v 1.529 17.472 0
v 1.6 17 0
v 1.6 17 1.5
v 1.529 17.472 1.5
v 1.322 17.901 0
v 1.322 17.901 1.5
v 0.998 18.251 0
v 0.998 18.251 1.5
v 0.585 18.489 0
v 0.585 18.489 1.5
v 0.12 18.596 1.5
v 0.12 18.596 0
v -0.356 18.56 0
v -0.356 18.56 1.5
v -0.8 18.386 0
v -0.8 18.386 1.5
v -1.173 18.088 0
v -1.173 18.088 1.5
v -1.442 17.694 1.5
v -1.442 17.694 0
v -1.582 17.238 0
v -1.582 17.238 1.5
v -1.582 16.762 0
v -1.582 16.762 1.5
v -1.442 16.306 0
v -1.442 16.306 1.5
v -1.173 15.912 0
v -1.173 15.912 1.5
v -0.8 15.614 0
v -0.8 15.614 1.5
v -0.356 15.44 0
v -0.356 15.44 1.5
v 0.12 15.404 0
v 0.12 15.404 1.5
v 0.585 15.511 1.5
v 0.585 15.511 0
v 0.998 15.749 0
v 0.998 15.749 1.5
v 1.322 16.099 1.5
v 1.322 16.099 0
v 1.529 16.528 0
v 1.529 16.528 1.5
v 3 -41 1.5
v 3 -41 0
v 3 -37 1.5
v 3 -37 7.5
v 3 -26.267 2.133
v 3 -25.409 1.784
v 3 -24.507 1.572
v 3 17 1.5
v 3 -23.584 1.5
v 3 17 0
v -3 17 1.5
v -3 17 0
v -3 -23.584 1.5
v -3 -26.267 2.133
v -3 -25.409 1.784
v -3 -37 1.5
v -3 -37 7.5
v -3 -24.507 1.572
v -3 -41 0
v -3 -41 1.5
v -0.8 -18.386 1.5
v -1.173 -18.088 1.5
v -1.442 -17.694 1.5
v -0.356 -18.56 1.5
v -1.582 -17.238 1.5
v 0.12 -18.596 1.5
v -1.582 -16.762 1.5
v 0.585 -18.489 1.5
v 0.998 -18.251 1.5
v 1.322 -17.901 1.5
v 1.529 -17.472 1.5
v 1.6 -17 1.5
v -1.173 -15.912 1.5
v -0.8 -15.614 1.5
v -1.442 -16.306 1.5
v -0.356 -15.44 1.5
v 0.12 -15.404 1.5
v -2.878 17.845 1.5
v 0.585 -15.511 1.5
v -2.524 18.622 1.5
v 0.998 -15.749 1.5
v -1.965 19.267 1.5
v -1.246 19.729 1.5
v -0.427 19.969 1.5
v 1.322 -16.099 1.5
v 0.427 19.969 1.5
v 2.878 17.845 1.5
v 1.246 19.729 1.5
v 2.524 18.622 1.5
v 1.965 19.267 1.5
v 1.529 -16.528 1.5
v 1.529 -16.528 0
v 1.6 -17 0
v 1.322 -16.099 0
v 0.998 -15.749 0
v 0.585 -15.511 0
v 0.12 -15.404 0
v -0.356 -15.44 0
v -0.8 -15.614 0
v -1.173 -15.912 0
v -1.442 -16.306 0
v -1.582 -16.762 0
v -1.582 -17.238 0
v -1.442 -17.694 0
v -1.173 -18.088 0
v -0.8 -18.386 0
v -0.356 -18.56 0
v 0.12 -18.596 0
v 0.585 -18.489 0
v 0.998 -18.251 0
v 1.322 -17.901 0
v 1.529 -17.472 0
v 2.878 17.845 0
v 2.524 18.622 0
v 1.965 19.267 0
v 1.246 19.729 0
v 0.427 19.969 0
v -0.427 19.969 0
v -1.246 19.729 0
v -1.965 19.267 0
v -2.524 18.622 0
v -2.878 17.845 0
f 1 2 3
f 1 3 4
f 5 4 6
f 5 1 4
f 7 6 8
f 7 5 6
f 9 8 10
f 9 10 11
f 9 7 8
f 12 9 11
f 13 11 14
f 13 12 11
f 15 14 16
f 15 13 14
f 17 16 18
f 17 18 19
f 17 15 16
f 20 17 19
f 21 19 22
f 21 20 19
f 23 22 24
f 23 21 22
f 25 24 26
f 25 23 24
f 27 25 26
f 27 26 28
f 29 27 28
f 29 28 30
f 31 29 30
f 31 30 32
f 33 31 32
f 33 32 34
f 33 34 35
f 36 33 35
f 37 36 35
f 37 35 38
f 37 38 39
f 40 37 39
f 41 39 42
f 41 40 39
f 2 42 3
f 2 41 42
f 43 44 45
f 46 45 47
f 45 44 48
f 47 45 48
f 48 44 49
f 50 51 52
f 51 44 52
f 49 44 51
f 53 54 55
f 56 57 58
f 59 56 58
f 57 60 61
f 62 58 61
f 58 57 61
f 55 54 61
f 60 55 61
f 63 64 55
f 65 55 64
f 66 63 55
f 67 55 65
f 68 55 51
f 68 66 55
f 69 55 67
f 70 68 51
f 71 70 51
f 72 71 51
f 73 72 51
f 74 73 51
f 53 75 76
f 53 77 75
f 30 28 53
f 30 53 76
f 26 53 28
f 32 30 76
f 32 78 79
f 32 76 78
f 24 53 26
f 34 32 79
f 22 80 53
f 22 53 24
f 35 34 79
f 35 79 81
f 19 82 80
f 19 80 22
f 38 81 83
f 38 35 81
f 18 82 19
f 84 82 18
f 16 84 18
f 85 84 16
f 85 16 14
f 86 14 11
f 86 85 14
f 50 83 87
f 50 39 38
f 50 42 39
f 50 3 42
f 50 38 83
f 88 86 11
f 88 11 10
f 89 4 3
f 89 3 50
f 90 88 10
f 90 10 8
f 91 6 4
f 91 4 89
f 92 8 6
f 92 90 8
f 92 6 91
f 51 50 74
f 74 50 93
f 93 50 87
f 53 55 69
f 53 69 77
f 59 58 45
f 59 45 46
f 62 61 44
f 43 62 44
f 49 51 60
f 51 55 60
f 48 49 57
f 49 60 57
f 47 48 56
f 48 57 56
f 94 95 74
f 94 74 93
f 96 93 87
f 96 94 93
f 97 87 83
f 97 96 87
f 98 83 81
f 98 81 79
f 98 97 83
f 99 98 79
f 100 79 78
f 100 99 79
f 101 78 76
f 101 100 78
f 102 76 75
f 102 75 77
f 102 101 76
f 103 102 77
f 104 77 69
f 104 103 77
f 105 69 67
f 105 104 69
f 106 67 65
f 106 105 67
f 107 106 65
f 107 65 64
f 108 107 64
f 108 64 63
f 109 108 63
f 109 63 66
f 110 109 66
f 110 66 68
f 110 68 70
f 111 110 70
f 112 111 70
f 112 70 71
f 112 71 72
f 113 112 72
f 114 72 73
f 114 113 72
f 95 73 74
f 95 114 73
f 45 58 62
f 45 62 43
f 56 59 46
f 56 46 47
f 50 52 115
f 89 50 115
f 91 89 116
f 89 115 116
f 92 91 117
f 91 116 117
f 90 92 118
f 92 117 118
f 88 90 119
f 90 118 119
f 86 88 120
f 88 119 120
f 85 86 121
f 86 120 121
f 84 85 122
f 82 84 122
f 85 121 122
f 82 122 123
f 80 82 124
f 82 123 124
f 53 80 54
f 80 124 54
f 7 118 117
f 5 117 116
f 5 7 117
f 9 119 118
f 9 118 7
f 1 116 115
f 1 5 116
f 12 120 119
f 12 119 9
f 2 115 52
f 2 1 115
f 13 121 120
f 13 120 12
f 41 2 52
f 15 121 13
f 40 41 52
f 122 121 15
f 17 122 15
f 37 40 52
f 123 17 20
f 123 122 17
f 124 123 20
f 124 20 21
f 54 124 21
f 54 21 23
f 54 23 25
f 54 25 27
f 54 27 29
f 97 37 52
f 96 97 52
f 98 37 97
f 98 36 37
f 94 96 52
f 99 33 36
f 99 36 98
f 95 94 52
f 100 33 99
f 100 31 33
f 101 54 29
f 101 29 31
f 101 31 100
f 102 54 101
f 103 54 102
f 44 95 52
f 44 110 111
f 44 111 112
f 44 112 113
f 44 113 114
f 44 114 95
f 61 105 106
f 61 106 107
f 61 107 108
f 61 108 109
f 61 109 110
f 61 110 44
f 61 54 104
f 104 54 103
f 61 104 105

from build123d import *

# Parameters (mm, degrees)
SKETCH_R     = 1.6
PAD_DEPTH    = 1.5
PAD001_DEPTH = 6
FILLET_R     = 6


with BuildPart() as part:
    # Sketch → Pad (new body)
    with BuildSketch(Plane.XY):
        with BuildLine():
            ThreePointArc((3, 16.999999), (-7e-06, 20), (-3, 16.999986))
            Line((-3, 16.999986), (-3, -37))
            Line((-3, -37), (-3, -41))
            Line((-3, -41), (3, -41))
            Line((3, -41), (3, -36.999987))
            Line((3, -36.999987), (3, 16.999999))
        make_face()
        with Locations((0, 17)):
            Circle(SKETCH_R, mode=Mode.SUBTRACT)
        with Locations((0, -17)):
            Circle(SKETCH_R, mode=Mode.SUBTRACT)
    extrude(amount=PAD_DEPTH)

    # Sketch001 → Pad001 (new body)
    with BuildSketch(Plane(origin=(-3, 0, 0), x_dir=(0, -1, 0), z_dir=(-1, 0, 0))):
        Polygon((37, 0), (37, 7.5), (22, 0), align=None)
    extrude(amount=-PAD001_DEPTH)

    # Fillet
    fillet_edges = [part.edges().sort_by_distance(p)[0] for p in [
        (0, -25, 1.5),
    ]]
    fillet(fillet_edges, radius=FILLET_R)


solid = part.part
